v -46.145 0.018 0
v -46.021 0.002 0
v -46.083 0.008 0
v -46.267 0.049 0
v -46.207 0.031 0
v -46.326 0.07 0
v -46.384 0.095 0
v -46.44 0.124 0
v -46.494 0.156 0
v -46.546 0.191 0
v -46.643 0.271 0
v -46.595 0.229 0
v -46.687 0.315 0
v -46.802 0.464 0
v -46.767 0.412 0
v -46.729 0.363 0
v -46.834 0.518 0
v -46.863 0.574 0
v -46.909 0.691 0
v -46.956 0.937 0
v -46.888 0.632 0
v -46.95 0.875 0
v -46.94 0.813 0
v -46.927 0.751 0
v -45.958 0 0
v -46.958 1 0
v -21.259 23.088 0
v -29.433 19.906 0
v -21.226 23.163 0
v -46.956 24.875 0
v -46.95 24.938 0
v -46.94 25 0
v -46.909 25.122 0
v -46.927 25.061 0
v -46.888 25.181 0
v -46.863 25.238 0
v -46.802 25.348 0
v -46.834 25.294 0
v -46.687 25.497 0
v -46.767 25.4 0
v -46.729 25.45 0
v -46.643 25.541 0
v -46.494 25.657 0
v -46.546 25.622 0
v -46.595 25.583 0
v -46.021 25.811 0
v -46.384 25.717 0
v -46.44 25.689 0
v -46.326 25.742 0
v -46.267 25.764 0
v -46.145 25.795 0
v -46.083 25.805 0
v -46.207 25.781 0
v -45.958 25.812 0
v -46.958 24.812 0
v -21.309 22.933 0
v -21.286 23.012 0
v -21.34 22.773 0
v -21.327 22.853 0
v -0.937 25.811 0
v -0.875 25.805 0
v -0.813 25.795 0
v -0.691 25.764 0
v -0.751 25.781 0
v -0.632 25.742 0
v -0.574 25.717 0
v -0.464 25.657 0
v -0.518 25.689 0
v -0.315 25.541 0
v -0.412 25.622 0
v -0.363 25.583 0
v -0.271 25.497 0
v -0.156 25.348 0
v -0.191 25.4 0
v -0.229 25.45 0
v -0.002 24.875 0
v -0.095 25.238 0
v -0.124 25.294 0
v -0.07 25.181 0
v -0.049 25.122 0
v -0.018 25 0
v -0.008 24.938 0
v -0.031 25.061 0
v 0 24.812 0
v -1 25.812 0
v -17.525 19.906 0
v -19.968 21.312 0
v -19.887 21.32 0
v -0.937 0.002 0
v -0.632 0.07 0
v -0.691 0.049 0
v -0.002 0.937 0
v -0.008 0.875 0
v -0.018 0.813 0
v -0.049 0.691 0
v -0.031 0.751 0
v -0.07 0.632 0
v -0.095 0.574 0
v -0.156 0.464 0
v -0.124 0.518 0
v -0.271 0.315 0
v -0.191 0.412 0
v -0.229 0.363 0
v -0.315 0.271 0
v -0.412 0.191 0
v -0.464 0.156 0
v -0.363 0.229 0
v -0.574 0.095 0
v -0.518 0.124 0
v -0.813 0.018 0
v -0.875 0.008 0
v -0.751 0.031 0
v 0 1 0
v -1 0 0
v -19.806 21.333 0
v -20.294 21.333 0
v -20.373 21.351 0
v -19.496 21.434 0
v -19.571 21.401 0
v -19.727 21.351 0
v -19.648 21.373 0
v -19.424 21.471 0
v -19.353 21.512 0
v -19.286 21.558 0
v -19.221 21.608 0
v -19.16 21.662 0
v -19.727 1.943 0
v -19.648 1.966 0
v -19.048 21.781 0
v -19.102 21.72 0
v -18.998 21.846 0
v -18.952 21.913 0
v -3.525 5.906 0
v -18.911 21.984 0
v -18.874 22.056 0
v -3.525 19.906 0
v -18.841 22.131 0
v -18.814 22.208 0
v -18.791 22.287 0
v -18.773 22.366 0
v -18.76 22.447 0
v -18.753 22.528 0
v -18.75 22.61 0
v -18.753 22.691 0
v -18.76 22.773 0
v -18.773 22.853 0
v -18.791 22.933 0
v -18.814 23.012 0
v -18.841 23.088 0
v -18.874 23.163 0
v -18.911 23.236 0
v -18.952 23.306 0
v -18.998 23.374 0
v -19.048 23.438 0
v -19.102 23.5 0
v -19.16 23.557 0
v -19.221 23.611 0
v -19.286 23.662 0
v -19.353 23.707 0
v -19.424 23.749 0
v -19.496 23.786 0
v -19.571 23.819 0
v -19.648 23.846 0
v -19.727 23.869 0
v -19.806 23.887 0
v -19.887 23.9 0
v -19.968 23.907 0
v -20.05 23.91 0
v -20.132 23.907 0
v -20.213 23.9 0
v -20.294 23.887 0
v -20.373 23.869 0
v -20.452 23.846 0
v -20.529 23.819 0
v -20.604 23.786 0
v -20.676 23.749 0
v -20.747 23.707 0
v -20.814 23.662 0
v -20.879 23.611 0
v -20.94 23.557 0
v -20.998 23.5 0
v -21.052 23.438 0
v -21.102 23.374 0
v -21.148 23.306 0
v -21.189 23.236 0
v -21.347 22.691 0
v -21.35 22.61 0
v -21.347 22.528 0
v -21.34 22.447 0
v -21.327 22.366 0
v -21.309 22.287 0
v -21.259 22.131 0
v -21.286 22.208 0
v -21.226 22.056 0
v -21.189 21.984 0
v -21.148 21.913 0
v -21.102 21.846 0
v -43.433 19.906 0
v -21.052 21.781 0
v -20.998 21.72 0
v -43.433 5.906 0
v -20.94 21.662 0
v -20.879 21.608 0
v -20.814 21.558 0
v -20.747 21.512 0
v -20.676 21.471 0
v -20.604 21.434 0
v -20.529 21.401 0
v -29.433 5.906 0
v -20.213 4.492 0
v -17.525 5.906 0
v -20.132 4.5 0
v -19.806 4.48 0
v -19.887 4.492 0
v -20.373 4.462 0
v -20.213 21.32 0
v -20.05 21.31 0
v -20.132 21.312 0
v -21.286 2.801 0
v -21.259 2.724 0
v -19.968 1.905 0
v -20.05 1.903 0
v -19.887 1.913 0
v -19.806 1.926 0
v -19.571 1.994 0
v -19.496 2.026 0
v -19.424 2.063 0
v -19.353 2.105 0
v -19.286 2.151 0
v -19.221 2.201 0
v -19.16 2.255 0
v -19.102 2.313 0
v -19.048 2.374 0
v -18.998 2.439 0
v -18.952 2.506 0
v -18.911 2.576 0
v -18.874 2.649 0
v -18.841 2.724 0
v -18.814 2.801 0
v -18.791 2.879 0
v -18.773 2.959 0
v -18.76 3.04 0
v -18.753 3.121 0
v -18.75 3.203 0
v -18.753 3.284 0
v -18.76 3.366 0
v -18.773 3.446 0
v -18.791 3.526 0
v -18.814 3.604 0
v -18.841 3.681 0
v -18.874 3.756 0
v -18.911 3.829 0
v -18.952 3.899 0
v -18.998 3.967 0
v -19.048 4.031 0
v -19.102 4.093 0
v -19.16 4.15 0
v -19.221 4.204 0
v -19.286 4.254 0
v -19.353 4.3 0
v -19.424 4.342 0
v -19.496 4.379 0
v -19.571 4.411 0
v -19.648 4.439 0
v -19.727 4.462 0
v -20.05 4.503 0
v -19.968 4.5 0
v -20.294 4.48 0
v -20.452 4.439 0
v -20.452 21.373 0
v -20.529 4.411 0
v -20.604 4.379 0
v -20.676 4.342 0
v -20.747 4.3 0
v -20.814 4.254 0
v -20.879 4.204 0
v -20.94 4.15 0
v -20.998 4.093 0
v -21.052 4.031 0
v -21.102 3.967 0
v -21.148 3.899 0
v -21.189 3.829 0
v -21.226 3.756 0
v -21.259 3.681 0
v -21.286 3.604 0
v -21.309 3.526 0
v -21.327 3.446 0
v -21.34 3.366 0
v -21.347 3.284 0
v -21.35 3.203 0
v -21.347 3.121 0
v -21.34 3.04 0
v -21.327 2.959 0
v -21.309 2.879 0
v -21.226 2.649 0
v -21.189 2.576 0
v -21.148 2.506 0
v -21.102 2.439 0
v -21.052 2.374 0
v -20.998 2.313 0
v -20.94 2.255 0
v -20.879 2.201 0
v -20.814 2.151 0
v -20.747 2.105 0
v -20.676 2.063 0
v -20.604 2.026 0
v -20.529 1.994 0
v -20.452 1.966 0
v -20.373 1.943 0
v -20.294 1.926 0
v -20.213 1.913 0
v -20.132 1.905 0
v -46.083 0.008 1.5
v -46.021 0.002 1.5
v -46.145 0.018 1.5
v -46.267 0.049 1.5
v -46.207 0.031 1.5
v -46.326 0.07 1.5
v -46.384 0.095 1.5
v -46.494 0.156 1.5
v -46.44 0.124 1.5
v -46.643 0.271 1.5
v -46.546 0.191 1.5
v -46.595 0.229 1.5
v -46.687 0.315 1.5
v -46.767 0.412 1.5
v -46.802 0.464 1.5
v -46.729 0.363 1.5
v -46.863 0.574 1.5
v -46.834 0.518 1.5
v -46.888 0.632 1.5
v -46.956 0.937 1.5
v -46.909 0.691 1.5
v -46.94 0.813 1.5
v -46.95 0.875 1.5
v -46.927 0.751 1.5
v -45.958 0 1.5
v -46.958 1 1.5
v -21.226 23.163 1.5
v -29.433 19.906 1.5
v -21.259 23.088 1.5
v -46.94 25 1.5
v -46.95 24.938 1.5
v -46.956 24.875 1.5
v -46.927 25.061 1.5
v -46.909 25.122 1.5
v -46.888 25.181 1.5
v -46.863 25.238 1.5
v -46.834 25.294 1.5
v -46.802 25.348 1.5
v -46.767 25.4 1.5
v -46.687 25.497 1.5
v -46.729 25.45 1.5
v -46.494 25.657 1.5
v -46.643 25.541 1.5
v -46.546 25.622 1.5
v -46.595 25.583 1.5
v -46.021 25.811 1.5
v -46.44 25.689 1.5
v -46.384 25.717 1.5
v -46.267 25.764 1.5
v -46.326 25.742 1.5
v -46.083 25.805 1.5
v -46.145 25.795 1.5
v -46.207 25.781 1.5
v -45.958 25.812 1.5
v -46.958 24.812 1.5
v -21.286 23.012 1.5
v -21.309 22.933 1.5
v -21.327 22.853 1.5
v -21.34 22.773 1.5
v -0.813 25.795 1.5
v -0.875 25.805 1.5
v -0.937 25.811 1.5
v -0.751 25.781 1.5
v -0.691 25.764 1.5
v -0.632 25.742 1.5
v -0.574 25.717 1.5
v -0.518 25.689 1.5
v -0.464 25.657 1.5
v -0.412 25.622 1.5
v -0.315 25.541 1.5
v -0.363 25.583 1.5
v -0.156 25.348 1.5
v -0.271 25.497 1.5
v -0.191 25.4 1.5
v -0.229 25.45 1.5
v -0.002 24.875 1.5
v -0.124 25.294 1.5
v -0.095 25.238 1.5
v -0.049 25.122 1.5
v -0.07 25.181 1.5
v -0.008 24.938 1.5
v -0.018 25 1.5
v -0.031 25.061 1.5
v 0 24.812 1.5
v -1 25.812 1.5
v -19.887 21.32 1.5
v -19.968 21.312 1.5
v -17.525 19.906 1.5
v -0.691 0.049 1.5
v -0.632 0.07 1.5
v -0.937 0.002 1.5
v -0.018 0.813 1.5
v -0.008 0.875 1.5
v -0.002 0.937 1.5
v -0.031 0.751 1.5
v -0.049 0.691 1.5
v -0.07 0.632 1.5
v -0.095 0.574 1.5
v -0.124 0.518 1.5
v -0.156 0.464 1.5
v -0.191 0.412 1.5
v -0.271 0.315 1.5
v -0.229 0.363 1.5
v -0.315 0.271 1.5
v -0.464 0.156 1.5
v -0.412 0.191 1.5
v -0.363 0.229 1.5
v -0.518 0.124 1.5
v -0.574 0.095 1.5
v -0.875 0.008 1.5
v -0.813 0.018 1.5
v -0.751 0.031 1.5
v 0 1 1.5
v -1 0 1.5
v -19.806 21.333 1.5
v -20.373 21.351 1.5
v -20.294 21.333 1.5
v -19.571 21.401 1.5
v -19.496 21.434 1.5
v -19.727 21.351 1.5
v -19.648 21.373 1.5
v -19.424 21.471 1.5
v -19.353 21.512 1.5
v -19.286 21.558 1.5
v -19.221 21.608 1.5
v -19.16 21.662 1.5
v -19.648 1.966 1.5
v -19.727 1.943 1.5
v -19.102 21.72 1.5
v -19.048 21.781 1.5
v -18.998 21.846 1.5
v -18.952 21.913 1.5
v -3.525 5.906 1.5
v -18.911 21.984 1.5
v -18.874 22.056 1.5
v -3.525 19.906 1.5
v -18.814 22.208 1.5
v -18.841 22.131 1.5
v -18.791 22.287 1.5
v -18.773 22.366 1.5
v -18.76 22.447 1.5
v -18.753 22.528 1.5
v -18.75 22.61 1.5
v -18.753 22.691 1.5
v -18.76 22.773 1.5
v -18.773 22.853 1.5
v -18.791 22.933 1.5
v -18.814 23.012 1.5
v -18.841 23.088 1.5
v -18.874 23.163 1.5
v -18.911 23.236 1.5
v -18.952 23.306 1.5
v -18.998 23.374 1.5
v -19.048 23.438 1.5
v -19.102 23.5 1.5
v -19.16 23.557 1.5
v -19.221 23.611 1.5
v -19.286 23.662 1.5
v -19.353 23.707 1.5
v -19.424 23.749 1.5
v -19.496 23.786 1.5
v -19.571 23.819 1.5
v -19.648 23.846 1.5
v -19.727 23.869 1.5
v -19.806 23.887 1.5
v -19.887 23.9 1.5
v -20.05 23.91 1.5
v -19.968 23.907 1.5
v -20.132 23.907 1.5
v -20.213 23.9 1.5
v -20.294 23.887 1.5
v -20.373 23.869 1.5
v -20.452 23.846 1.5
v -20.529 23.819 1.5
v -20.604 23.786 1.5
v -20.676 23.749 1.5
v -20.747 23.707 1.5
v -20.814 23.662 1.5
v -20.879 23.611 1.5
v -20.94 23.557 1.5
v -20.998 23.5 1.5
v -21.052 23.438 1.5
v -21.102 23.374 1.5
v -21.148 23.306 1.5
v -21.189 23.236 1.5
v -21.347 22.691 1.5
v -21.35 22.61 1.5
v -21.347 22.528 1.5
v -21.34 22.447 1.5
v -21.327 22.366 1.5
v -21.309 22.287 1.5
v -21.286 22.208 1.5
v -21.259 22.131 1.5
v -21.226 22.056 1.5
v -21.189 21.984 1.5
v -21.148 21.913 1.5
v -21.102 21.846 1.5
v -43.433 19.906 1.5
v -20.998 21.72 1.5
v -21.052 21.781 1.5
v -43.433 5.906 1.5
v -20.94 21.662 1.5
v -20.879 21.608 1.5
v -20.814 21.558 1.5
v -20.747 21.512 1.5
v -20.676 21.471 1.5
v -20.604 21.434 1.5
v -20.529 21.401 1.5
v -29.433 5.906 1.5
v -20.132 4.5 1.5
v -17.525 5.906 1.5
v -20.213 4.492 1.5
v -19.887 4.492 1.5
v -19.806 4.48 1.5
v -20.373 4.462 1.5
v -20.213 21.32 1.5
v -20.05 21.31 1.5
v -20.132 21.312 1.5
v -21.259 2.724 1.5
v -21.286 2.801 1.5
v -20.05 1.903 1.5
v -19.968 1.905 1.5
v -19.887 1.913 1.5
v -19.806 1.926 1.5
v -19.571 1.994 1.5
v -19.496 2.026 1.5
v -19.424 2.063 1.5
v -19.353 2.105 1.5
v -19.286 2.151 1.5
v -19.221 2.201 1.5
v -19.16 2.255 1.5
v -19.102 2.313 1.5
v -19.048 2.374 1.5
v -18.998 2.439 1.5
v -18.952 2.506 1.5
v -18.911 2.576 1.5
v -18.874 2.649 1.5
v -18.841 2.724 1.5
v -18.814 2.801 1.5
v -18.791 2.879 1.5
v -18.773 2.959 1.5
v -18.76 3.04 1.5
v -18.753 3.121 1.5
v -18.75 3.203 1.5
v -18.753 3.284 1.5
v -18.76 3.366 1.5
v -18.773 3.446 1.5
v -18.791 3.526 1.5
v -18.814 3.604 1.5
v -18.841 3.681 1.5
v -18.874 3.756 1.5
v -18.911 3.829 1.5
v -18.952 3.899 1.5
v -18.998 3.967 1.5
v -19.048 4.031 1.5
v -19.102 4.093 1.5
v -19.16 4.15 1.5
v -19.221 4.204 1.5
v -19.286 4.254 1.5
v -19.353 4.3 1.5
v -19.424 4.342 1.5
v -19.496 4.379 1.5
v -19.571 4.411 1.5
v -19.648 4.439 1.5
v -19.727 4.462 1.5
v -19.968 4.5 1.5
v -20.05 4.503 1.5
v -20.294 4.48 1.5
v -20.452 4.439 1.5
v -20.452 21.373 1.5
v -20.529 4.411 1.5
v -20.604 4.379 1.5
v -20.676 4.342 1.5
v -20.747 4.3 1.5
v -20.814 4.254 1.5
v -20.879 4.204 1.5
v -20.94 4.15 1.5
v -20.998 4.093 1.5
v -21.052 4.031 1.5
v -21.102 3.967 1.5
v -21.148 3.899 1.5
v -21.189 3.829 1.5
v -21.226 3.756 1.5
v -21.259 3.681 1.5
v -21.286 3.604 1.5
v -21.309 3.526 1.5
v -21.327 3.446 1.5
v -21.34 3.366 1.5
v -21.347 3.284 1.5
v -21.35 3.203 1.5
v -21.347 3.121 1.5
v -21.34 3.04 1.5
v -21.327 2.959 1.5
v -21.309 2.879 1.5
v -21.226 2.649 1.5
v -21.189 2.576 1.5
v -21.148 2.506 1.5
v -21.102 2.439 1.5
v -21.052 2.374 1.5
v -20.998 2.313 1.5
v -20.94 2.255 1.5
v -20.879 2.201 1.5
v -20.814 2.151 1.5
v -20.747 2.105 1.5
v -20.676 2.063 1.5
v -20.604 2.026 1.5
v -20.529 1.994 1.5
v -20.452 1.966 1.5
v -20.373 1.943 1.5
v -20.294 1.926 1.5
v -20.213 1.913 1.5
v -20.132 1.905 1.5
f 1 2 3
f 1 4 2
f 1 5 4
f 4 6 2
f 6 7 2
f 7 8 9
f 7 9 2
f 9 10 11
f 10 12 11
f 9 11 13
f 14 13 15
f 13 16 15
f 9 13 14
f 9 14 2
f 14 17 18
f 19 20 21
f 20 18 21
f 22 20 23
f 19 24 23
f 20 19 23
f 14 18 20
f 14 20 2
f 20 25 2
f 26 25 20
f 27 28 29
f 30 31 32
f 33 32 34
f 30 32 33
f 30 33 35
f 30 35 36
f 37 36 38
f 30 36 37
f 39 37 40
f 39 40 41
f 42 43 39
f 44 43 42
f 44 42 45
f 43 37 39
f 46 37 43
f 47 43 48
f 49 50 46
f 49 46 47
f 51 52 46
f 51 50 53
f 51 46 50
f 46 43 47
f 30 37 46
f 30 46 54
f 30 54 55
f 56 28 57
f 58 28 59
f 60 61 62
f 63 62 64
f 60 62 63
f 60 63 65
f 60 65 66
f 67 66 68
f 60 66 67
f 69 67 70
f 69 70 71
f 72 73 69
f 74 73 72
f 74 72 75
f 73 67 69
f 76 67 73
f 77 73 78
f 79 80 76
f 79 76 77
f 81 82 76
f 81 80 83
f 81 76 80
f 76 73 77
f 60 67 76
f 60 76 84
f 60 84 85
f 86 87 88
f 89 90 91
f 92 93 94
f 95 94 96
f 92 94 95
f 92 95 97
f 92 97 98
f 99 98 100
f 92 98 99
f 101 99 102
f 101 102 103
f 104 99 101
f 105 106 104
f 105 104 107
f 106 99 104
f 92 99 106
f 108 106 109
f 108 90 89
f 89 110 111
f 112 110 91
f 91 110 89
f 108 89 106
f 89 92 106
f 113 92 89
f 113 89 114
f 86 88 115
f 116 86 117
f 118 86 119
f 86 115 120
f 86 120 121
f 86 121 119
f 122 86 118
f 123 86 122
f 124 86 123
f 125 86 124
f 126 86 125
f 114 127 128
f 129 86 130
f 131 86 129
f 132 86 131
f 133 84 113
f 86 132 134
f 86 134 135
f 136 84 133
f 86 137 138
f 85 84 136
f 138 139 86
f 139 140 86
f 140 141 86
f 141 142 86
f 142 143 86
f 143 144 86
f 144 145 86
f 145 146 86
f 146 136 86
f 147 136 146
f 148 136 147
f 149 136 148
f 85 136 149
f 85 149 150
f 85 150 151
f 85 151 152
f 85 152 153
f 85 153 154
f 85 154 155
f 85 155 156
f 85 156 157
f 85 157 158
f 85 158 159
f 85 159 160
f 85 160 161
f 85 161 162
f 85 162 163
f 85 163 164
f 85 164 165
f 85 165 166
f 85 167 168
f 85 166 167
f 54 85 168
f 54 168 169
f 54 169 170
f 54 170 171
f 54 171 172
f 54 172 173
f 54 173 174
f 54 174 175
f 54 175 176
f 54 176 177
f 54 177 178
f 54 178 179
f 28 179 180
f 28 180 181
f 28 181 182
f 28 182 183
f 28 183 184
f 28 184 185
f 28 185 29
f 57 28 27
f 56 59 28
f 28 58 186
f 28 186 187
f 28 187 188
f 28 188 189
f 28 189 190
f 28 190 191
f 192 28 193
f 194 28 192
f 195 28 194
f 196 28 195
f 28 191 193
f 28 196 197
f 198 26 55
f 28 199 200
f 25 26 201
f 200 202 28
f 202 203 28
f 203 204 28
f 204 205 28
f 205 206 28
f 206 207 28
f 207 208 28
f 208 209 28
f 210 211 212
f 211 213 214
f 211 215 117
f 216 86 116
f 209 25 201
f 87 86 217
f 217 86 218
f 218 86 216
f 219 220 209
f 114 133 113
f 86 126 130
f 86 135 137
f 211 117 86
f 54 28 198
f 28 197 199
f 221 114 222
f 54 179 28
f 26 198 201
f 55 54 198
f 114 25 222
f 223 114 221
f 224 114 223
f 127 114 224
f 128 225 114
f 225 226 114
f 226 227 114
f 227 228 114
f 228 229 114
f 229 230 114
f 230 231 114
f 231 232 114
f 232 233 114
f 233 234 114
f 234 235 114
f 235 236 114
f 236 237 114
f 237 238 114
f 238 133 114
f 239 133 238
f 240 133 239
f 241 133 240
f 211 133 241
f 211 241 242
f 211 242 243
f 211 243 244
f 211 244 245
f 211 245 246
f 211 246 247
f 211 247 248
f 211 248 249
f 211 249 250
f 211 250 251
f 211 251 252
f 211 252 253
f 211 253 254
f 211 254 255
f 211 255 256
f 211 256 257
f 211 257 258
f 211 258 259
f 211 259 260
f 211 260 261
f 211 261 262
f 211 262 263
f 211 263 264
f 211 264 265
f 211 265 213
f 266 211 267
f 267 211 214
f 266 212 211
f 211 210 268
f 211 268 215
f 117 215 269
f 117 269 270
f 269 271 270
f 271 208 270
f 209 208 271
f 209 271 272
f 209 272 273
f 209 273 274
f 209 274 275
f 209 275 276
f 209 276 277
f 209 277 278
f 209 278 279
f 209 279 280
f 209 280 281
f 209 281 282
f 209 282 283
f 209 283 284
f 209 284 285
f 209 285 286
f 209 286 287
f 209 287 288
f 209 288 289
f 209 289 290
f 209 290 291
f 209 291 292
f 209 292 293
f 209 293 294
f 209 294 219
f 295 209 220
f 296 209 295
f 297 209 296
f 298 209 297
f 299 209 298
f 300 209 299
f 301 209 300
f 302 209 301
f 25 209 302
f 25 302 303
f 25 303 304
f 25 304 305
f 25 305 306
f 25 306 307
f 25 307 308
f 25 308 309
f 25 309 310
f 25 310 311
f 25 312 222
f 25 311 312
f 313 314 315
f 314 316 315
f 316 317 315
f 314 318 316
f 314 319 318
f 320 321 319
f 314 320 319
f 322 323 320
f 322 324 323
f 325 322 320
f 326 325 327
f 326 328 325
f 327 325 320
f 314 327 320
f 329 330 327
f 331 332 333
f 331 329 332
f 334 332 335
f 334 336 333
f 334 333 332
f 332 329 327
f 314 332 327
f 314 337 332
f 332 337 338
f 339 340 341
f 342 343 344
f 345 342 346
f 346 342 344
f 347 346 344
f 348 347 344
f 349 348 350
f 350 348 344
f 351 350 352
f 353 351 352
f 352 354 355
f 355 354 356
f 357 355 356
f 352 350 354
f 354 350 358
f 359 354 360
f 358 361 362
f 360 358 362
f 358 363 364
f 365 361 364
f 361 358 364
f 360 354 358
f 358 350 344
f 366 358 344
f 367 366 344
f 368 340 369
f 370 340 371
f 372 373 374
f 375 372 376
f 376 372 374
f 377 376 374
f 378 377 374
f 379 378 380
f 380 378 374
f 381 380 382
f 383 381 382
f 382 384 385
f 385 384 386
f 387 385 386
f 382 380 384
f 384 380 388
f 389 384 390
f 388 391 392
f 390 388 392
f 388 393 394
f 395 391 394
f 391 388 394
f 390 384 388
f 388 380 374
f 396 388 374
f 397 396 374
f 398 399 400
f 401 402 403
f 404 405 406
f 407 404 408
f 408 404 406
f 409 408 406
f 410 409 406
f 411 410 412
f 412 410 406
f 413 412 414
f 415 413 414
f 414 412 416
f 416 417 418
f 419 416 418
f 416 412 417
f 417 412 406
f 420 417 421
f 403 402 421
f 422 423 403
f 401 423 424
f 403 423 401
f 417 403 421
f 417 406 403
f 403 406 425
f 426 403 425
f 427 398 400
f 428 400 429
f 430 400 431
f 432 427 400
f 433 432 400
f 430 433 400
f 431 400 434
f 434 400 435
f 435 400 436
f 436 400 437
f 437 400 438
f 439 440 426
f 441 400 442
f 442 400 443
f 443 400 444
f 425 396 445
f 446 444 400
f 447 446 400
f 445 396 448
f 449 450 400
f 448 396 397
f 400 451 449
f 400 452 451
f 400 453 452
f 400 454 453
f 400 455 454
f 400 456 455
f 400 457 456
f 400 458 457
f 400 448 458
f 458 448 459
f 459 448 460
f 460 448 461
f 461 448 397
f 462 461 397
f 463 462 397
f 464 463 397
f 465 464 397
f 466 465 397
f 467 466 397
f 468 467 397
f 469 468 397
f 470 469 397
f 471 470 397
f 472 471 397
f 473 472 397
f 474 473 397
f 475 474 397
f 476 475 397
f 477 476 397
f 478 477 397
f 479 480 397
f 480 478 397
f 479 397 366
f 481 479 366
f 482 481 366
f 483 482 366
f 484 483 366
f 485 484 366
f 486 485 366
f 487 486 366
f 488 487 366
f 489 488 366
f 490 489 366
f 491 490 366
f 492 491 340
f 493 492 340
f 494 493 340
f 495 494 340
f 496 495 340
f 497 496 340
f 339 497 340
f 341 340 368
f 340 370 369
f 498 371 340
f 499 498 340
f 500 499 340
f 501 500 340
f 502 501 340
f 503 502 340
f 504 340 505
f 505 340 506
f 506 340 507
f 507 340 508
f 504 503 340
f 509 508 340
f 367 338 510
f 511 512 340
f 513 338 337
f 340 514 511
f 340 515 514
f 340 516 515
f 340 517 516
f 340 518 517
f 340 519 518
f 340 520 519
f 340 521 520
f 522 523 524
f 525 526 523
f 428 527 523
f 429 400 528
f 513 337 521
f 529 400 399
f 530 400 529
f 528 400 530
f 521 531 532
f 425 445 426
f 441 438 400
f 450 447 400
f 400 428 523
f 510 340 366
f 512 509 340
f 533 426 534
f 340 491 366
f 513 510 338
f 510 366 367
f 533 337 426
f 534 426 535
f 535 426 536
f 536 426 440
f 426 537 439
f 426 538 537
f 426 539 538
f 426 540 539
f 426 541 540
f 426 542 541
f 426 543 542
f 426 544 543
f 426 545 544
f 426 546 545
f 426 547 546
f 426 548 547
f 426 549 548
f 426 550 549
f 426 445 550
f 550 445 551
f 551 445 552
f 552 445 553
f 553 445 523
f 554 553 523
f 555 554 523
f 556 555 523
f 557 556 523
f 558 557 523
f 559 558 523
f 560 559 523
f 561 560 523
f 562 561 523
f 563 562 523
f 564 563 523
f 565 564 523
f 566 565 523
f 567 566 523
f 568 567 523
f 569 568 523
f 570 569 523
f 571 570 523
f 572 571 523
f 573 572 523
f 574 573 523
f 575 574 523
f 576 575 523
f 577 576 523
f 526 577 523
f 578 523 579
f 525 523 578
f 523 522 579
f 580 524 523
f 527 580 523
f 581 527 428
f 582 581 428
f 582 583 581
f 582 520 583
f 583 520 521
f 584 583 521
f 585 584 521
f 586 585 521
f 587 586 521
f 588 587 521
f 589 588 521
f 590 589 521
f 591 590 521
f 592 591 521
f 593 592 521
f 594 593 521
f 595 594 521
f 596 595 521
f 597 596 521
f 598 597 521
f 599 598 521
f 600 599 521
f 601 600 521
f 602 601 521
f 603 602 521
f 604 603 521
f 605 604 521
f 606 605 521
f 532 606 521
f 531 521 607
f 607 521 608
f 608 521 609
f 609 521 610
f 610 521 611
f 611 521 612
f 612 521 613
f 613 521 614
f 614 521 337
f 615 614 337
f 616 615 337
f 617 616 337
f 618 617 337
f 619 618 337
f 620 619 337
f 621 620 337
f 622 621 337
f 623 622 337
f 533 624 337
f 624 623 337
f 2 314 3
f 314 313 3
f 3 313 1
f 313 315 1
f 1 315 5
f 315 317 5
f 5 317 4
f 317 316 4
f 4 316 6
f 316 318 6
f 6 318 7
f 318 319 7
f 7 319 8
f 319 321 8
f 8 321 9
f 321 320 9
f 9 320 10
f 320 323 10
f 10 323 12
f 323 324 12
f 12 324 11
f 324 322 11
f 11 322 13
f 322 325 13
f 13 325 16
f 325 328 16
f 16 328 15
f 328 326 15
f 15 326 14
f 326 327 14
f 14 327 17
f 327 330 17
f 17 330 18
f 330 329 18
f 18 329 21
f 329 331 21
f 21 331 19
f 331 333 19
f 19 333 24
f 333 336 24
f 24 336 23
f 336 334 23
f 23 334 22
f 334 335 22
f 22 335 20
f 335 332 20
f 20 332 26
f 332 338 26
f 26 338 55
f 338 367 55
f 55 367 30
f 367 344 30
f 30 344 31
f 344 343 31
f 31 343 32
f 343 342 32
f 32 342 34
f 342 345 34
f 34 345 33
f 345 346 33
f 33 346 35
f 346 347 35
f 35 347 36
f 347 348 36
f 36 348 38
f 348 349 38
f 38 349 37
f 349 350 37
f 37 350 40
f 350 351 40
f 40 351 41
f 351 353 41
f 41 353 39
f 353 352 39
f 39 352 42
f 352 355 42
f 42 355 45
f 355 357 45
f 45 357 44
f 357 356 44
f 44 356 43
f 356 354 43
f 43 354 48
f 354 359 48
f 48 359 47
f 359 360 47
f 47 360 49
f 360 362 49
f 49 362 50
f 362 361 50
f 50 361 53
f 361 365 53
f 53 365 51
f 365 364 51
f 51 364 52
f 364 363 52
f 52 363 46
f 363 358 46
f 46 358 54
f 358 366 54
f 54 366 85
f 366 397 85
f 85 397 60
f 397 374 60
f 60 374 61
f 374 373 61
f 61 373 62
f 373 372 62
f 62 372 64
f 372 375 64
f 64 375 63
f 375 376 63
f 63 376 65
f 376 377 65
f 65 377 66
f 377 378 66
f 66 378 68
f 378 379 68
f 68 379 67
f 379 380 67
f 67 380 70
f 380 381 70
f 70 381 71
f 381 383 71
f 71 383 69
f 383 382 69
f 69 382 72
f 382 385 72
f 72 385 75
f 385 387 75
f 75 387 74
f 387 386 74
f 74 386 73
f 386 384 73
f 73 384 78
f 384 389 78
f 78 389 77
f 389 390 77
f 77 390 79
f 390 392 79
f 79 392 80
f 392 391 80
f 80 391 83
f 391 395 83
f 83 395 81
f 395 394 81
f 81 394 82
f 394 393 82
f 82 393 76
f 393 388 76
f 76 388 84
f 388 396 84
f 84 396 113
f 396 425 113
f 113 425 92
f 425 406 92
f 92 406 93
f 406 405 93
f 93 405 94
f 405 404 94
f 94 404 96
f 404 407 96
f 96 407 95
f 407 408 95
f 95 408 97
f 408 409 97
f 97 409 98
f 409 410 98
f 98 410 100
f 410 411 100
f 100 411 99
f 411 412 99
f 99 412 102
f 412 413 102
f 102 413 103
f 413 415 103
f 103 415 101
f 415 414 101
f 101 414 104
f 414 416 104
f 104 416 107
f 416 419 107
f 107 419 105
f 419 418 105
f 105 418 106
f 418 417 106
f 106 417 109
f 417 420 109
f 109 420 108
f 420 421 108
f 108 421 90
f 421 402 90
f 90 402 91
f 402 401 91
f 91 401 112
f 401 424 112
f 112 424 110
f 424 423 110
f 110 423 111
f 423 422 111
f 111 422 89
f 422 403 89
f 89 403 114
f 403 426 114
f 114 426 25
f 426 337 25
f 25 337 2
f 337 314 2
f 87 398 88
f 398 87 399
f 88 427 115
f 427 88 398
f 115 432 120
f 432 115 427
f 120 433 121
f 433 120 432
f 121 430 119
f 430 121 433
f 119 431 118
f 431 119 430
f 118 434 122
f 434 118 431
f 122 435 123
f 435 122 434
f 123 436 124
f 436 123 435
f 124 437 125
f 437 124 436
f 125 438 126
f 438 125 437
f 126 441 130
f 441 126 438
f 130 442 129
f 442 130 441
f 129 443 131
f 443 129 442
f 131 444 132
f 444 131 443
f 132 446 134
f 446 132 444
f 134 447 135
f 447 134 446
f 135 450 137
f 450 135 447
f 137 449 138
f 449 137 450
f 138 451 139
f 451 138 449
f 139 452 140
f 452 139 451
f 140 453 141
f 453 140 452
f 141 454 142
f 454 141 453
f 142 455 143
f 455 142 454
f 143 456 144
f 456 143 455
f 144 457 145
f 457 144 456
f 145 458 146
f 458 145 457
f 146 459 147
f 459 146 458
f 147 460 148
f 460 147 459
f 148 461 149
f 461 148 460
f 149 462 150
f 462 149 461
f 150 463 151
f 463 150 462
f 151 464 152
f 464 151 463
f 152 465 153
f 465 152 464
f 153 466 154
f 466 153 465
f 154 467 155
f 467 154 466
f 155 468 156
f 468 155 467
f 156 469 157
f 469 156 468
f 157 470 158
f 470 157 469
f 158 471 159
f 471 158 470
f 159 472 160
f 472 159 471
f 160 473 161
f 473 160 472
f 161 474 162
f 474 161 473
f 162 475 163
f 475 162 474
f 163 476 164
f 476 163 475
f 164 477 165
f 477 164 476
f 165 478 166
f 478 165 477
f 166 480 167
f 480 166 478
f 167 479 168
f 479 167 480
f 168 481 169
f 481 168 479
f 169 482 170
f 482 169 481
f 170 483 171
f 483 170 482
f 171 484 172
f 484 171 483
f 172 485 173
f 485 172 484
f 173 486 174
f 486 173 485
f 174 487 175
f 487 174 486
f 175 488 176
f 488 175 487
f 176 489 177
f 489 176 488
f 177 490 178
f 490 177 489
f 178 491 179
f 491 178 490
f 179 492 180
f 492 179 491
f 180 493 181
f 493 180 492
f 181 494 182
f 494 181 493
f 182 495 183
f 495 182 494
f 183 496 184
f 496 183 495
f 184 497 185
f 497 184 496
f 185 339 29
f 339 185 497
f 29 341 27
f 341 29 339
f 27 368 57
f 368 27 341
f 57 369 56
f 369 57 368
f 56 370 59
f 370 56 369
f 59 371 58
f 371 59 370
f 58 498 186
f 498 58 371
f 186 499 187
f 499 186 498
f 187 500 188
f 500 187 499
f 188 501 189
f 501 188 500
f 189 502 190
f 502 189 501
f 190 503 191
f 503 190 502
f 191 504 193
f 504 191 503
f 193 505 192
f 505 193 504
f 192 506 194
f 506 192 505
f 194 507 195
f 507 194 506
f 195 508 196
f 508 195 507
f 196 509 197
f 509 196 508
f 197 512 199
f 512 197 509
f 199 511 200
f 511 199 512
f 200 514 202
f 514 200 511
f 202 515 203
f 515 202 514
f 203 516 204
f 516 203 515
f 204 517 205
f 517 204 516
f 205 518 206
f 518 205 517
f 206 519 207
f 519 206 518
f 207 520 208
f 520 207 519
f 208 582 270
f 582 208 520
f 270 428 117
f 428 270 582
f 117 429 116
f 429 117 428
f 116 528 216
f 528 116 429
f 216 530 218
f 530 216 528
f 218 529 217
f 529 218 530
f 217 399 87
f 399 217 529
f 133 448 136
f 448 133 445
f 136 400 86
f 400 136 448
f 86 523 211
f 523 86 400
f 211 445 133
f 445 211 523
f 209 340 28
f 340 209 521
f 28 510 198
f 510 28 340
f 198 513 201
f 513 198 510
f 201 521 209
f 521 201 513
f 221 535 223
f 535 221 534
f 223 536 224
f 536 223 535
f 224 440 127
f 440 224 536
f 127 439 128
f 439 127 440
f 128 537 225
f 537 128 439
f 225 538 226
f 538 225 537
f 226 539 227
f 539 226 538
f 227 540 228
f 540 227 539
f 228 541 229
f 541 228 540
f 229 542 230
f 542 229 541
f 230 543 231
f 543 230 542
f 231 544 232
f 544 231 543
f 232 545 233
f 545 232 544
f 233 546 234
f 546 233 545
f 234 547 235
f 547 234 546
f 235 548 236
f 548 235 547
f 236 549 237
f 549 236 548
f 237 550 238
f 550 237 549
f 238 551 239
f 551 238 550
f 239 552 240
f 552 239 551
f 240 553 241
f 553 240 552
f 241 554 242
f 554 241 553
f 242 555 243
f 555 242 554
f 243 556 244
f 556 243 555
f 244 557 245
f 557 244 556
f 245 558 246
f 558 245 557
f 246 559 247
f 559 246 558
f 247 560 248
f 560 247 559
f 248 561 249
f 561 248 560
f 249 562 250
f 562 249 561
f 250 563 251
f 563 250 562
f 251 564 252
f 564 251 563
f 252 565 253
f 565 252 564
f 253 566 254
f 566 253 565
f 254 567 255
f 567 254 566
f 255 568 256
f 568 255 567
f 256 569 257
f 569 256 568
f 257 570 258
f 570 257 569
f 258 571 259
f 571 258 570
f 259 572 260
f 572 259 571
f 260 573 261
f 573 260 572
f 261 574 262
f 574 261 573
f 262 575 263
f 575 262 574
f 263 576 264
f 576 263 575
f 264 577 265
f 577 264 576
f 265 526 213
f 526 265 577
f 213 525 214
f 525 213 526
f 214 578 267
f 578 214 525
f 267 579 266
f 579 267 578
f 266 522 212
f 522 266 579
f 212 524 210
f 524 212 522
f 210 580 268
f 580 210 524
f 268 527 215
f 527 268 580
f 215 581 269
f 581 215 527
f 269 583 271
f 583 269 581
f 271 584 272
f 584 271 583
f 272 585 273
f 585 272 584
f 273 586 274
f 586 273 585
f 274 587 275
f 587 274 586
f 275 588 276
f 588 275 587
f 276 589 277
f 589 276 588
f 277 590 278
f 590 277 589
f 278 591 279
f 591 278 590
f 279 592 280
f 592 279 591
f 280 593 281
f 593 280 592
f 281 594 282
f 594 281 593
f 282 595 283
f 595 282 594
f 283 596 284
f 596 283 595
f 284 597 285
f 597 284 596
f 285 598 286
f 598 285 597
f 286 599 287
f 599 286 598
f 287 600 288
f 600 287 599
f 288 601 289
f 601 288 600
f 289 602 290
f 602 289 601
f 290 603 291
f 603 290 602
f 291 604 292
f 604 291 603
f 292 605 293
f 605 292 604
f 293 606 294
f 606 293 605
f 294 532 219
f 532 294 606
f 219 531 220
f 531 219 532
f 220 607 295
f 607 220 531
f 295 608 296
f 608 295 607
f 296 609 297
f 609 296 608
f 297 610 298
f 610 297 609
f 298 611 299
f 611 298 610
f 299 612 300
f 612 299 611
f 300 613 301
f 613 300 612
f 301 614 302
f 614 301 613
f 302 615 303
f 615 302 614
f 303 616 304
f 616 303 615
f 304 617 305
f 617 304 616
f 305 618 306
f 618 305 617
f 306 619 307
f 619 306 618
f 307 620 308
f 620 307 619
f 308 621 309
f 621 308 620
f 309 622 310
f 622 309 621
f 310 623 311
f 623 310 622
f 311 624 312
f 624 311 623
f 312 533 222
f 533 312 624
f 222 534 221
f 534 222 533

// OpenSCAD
// file: ../modules/shapes.scad
// draws a square with rounded corners
module squircle(
    size = [1,1],
    radius = 1,
    center = false){
    
    x = size[0];
    y = size[1];
    radius = min(x/2,min(y/2, radius));
    translation = [0,0];
        
    module corner(){
            intersection(){
                square([radius,radius]);
                translate([radius, radius])
                    circle(radius);
            }
    }
    
    module body(){
    
        corner();
        
        translate([0, y])        
            rotate([0,0,-90])
                corner();
        
        translate([x, y])        
            rotate([0,0,180])
                corner();
        
        translate([x, 0])        
            rotate([0,0, 90])
                corner();
        
        translate([radius, 0])
            square([x - 2 * radius, radius]);
        
        translate([0, radius])
            square([x, y - radius * 2]);
            
        translate([radius, y - radius])
            square([x - 2 * radius, radius]);
    }
    
    if(center)
        translate([-x/2, -y/2])
            body();
    else
        body();
}
// file: ../modules/keycap.scad
use<shapes.scad>

// draws a rough no-profile at keycap 0,0 1U space
module keycap(keyHeight = 1.0){
  
    width = 18;
    depth = 18 * keyHeight;
    height = 9;

    translate([19.05/2, 19.05/2, 7])
        linear_extrude(height, scale = [0.7,0.7])
          squircle([width, depth], 1, center = true);	
}
// file: ../modules/switch.scad
use<shapes.scad>;

// draws a rough Cherry MX style switch at 0,0 1U space
module switch(){
    
    ringWidth = 15.6;
    ringHeight = 1.0;

    bottomTopWidth = 14.0;
    bottomBottomWidth = 12.0;
    bottomHeight = 5.0;

    topBottomWidth = 14.5;
    topTopWidth = 10;
    topHeight = 11.6 - bottomHeight - ringHeight;

    module switch_stem(){

        width = 3.6;
        height = 3.6;
        depth = 1.2;
        edgeRadius = 0.2;

		color("FireBrick",1)
            translate([0,0, ringHeight + topHeight])
                linear_extrude(height = height){
                    squircle([width, depth], edgeRadius, true);
                    rotate([0,0,90])
                        squircle([width, depth], edgeRadius, true);
                }
    }

    module switch_top(){
		color("WhiteSmoke",1)
            translate([0,0,ringHeight])
                linear_extrude(topHeight, scale = topTopWidth / topBottomWidth)
                    translate([-topBottomWidth/2,-topBottomWidth/2,0])
                        squircle([topBottomWidth,topBottomWidth], 1.0);
    }
                    
    module switch_middle(){
		color("WhiteSmoke",1)
            linear_extrude(ringHeight)
                squircle([ringWidth, ringWidth], 1.0, center = true);
    }

    module switch_bottom(){
		color("WhiteSmoke",1)
            translate([0,0,-bottomHeight])
                linear_extrude(bottomHeight, scale = bottomTopWidth / bottomBottomWidth)
                    translate([-bottomBottomWidth/2,-bottomBottomWidth/2,0])
                        squircle([bottomBottomWidth,bottomBottomWidth], 1.0);
    }

    translate([19.05/2,19.05/2,0]){
        switch_stem();
        switch_top();
        switch_middle();
        switch_bottom();
    }
}

switch();
// file: ../modules/bearingMount.scad
include <../config.scad>;
use <./plate.scad>;

module hole(){

    linear_extrude(BEARING_BOLT_CLEARANCE_Z)
        boltHole();

    translate([0,0, BEARING_BOLT_CLEARANCE_Z])
        linear_extrude(BEARING_MOUNT_HEIGHT)
            circle(d = BOLT_TOP_DIAMETER + BOLT_TOLERENCE * 2);
}

module bearingMount(){

    trackballRadius = getTrackballHoleRadius();
    ringWidthBottom = TRACKBALL_PLATE_BEZEL;
    
    difference(){
        
        union(){

            rotate_extrude(convexity = 10)
                minkowski(){
                    polygon([
                        [trackballRadius + BEARING_MOUNT_TOP_CURVE_RADIUS,0],
                        [trackballRadius + ringWidthBottom - BEARING_MOUNT_TOP_CURVE_RADIUS, 0],
                        [trackballRadius - BEARING_MOUNT_TOP_CURVE_RADIUS + BEARING_MOUNT_TOP_X_MAX, BEARING_MOUNT_HEIGHT - BEARING_MOUNT_TOP_CURVE_RADIUS],
                        [trackballRadius + BEARING_MOUNT_TOP_CURVE_RADIUS + BEARING_MOUNT_TOP_X_MIN, BEARING_MOUNT_HEIGHT - BEARING_MOUNT_TOP_CURVE_RADIUS],
                    ]);
                    
                    difference(){
                        circle(r = BEARING_MOUNT_TOP_CURVE_RADIUS);
                        translate([-BEARING_MOUNT_TOP_CURVE_RADIUS, -BEARING_MOUNT_TOP_CURVE_RADIUS * 2])
                            square([BEARING_MOUNT_TOP_CURVE_RADIUS * 2, BEARING_MOUNT_TOP_CURVE_RADIUS * 2]);
                    }
                }
        }

        // bearing holes

        bearingOffsetXY = 
            sqrt(
                (TRACKBALL_DIAMETER * TRACKBALL_DIAMETER) / 4 -
                ((BEARING_OFFSET_Z + PLATE_THICKNESS) * (BEARING_OFFSET_Z + PLATE_THICKNESS)))
                + BEARING_DIAMETER * 0.5;

        translate([0,0, BEARING_OFFSET_Z])
            for (i = [0:2]) {
                
                angle = 120 * i;

                translate([cos(angle), sin(angle), 0] * bearingOffsetXY){
                    rotate([0, 0, angle])                
                        sphere(d = BEARING_DIAMETER);
                }
            }
            
        // standoff holes

        translate([0, SENSOR_PCB_MOUNT_OFFSET])
            hole();

        translate([0, -SENSOR_PCB_MOUNT_OFFSET])
            hole();
        
    }
}

bearingMount($fn = 100);
// file: ../modules/adnsCover.scad
include <../config.scad>;
use <../modules/shapes.scad>;
use <../modules/plate.scad>;

module adnsCover(){
    difference(){
        linear_extrude(STANDOFF_HEIGHT)
            difference(){
                circle(d = ADNS_PCB_DIAMETER);
                
                // bolts cutouts

                translate([0, SENSOR_PCB_MOUNT_OFFSET])
                    circle(d = BOLT_DIAMETER + BOLT_TOLERENCE * 2);

                translate([0, -SENSOR_PCB_MOUNT_OFFSET])
                    circle(d = BOLT_DIAMETER + BOLT_TOLERENCE * 2);

                // laser channel
                squircle(
                    size = [SENSOR_CHANNEL_WIDTH, SENSOR_CHANNEL_HEIGHT],
                    radius = 1,
                    center = true);
            }
        
        // cutout for sensor
        linear_extrude(SENSOR_LENS_HEIGHT_ABOVE_BOARD + 1)
            squircle(
                size = [SENSOR_LENS_WIDTH, SENSOR_LENS_HEIGHT],
                radius = 4,
                center = true);
                
        // cutout for trackball
        translate([0, 0, getTrackballZ() + STANDOFF_HEIGHT + PLATE_THICKNESS - 1])
            sphere(d = TRACKBALL_DIAMETER);
    }
}

rotate([180,0,0])
    adnsCover($fn = 100);
// file: ../modules/keys.scad
include <../config.scad>;
use <./plate.scad>;
use <./adnsCover.scad>;
use <./bearingMount.scad>;
use <./switch.scad>;
use <./keycap.scad>;

// draws 3D keycaps and trackballs with the given positions in 1U space
module keys(
    keyPositions = [],
    keyHeight = 1.0){
        
    for(keyPosition = keyPositions)
        translate([keyPosition.x, keyPosition.y * keyHeight] * 1U + [PLATE_BEZEL,PLATE_BEZEL])
        
            if(keyPosition.z == "trackball")
                translate([0.5, 0.5 * keyHeight, 0] * 1U){
                    
                    translate([0, 0, getTrackballZ()])
                        sphere(d = TRACKBALL_DIAMETER);
                    
                    translate([0, 0, -STANDOFF_HEIGHT - TRACKBALL_PCB_THICKNESS])
                        cylinder(d = ADNS_PCB_DIAMETER, h = TRACKBALL_PCB_THICKNESS);

                    translate([0, 0, -STANDOFF_HEIGHT])
                        adnsCover();

                    translate([0,0, PLATE_THICKNESS])
                        bearingMount();
                }

            else
                translate([0,  (keyHeight - 1) * 1U * 0.5, PLATE_THICKNESS]){
                    keycap(keyHeight);
                    switch();
                }
}

keys(FINGER_GRID, $fn = 100);
// file: ../modules/plate.scad
include <../config.scad>;

function getTrackballZ() = 
    PLATE_THICKNESS +
    -STANDOFF_HEIGHT +
    SENSOR_LENS_HEIGHT_ABOVE_BOARD +
    SENSOR_LENS_CLEARANCE +
    TRACKBALL_DIAMETER * 0.5;
    
function getTrackballHoleRadius() =
    sqrt(
        (TRACKBALL_DIAMETER * TRACKBALL_DIAMETER) / 4 -
        getTrackballZ() * getTrackballZ())
        + TRACKBALL_PLATE_CLEARANCE;

// draws a 2D circle representing a bolt hole
module boltHole(){
    circle(d = BOLT_DIAMETER + BOLT_TOLERENCE * 2);
}

// draws a 2D plate with the given key positions in 1U space
module plate(
    keyPositions = [],
    keyHeight = 1.0,
    boltPositions = [],
    cutHoles = true,
    hull = false){

    module solidPlate(){
        offset(delta = -PLATE_CURVE_RADIUS)
            for(keyPosition = keyPositions)
                translate([keyPosition.x, keyPosition.y * keyHeight] * 1U)

                    if(keyPosition.z == "adns" || keyPosition.z == "pmw")
                        translate([0.5, 0.5 * keyHeight] * 1U + [PLATE_BEZEL,PLATE_BEZEL])
                            offset(delta = TRACKBALL_PLATE_BEZEL)
                                circle(r = getTrackballHoleRadius());

                    else
                        square([1, keyHeight] * 1U + [1, 1] * PLATE_BEZEL * 2);
    }

    difference(){
        
        // outline
        minkowski() {
            if(hull)
                hull()
                    solidPlate();
            else
                solidPlate();
            
            circle(r = PLATE_CURVE_RADIUS);
        }
        
        // cutouts
        translate([PLATE_BEZEL, PLATE_BEZEL]){

            if(cutHoles){
                for(keyPosition = keyPositions)
                    translate([keyPosition.x + 0.5, (keyPosition.y + 0.5) * keyHeight] * 1U)

                    if(keyPosition.z == "adns" || keyPosition.z == "pmw")
                        circle(r = getTrackballHoleRadius());
                    else
                        translate(-[SWITCH_WIDTH, SWITCH_WIDTH] * 0.5)
                            square([SWITCH_WIDTH,SWITCH_WIDTH]);                        

                for(keyPosition = keyPositions){
                    translate([keyPosition.x + 0.5, (keyPosition.y + 0.5) * keyHeight] * 1U){
                        if(keyPosition.z == "adns" || keyPosition.z == "pmw"){
                            translate([0, SENSOR_PCB_MOUNT_OFFSET, 0])
                                boltHole();
                            translate([0, -SENSOR_PCB_MOUNT_OFFSET, 0])
                                boltHole();
                        }
                    }
                }

                for(boltPosition = boltPositions)
                    translate([boltPosition.x, boltPosition.y * keyHeight] * 1U)
                        boltHole();
            }
        }
    }
}

plate(
    keyPositions = FINGER_GRID,
    keyHeight = 1.0,
    boltPositions = FINGER_BOLT_HOLES,
    cutHoles = true,
    $fn = 100);
// file: ../config.scad
// draw flags

DRAW_DEBUG = false;

// MX constants

1U = 19.05;
SWITCH_WIDTH = 14;

// hardware

NUT_DIAMETER = 4;
NUT_TOLERENCE = 0.5;
BOLT_DIAMETER = 2.4; // M2 cleanance
BOLT_TOLERENCE = 0.1;
BOLT_TOP_DIAMETER = 3.8; // TODO: measure
STANDOFF_HEIGHT = 10;
BEARING_DIAMETER = 3.175;

// plate

PLATE_THICKNESS = 1.5;
PLATE_BEZEL = 1;
PLATE_CURVE_RADIUS = 1;

// trackball

TRACKBALL_DIAMETER = 24.9;
TRACKBALL_PLATE_CLEARANCE = 1.5;
TRACKBALL_LENS_CLEARANCE = 2.4; // from ADNS9800 data sheet
TRACKBALL_LENS_HEIGHT_ABOVE_BOARD = 1.5;// TODO: measure
TRACKBALL_PCB_MOUNT_OFFSET = 13.5;
TRACKBALL_PCB_DIAMETER = 32;
TRACKBALL_PCB_THICKNESS = 1.5;

// bearing mount

BEARING_OFFSET_Z = 2.5;
BEARING_MOUNT_TOP_CURVE_RADIUS = 0.5;
BEARING_MOUNT_TOP_X_MIN = 2.5;
BEARING_MOUNT_TOP_X_MAX = 4.0;
BEARING_MOUNT_HEIGHT = 4.5;
BEARING_BOLT_CLEARANCE_Z = 1;

// PCB

PCB_PLATE_OFFSET_Z = 5;
PCB_THICKNESS = 1.5;
PCB_UNDERSIDE_CLEARANCE = 3;

// case

CASE_PLATE_BEZEL = 1;
CASE_PLATE_TOLERENCE = 0.25;
CASE_CURVE_RADIUS = 1;
CASE_PLATE_MOUNT_COVERAGE = 1;

// layouts in 1U space

FINGER_GRID = 
    [[0, 2], [1, 2], [2, 2.25], [3, 2.37], [4, 2.25], [5, 2.12],
     [0, 1], [1, 1], [2, 1.25], [3, 1.37], [4, 1.25], [5, 1.12],
     [0, 0], [1, 0], [2, 0.25], [3, 0.37], [4, 0.25], [5, 0.12]];

FINGER_BOLT_HOLES =
    [[1, 2], [5, 2.185],
     [1, 1], [5, 1.185]];

THUMB_GRID = [[0, 0], [1, 0.1]];

THUMB_BOLT_HOLES = 
    [[1, 1],
     [1, 0.0925]];

THUMB_TRACKBALL_GRID = [[0, 0], [1.36, 0, "trackball"]];

THUMB_TRACKBALL_BOLT_HOLES = 
    [[1, 0.9075],
     [1, 0.0925]];

// plane rotations

HAND_ROTATION = [0, -12, 3];
THUMB_ROTATION = [10, -2, -10.25];
THUMB_OFFSET = [80.5, -22, 13.5];
// main file
include <../config.scad>;
use <../modules/plate.scad>;
use <../modules/keys.scad>;

mirror([1,0,0]){
    linear_extrude(PLATE_THICKNESS)
        plate(
            keyPositions = THUMB_TRACKBALL_GRID,
            keyHeight = 1.25,
            boltPositions = THUMB_TRACKBALL_BOLT_HOLES,
            cutSwitchHoles = true,
            hull = true,
            $fn = 100);
    
    if(DRAW_DEBUG)
        %keys(
            keyPositions = THUMB_TRACKBALL_GRID,
            keyHeight = 1.25,
            $fn = 50);
}
